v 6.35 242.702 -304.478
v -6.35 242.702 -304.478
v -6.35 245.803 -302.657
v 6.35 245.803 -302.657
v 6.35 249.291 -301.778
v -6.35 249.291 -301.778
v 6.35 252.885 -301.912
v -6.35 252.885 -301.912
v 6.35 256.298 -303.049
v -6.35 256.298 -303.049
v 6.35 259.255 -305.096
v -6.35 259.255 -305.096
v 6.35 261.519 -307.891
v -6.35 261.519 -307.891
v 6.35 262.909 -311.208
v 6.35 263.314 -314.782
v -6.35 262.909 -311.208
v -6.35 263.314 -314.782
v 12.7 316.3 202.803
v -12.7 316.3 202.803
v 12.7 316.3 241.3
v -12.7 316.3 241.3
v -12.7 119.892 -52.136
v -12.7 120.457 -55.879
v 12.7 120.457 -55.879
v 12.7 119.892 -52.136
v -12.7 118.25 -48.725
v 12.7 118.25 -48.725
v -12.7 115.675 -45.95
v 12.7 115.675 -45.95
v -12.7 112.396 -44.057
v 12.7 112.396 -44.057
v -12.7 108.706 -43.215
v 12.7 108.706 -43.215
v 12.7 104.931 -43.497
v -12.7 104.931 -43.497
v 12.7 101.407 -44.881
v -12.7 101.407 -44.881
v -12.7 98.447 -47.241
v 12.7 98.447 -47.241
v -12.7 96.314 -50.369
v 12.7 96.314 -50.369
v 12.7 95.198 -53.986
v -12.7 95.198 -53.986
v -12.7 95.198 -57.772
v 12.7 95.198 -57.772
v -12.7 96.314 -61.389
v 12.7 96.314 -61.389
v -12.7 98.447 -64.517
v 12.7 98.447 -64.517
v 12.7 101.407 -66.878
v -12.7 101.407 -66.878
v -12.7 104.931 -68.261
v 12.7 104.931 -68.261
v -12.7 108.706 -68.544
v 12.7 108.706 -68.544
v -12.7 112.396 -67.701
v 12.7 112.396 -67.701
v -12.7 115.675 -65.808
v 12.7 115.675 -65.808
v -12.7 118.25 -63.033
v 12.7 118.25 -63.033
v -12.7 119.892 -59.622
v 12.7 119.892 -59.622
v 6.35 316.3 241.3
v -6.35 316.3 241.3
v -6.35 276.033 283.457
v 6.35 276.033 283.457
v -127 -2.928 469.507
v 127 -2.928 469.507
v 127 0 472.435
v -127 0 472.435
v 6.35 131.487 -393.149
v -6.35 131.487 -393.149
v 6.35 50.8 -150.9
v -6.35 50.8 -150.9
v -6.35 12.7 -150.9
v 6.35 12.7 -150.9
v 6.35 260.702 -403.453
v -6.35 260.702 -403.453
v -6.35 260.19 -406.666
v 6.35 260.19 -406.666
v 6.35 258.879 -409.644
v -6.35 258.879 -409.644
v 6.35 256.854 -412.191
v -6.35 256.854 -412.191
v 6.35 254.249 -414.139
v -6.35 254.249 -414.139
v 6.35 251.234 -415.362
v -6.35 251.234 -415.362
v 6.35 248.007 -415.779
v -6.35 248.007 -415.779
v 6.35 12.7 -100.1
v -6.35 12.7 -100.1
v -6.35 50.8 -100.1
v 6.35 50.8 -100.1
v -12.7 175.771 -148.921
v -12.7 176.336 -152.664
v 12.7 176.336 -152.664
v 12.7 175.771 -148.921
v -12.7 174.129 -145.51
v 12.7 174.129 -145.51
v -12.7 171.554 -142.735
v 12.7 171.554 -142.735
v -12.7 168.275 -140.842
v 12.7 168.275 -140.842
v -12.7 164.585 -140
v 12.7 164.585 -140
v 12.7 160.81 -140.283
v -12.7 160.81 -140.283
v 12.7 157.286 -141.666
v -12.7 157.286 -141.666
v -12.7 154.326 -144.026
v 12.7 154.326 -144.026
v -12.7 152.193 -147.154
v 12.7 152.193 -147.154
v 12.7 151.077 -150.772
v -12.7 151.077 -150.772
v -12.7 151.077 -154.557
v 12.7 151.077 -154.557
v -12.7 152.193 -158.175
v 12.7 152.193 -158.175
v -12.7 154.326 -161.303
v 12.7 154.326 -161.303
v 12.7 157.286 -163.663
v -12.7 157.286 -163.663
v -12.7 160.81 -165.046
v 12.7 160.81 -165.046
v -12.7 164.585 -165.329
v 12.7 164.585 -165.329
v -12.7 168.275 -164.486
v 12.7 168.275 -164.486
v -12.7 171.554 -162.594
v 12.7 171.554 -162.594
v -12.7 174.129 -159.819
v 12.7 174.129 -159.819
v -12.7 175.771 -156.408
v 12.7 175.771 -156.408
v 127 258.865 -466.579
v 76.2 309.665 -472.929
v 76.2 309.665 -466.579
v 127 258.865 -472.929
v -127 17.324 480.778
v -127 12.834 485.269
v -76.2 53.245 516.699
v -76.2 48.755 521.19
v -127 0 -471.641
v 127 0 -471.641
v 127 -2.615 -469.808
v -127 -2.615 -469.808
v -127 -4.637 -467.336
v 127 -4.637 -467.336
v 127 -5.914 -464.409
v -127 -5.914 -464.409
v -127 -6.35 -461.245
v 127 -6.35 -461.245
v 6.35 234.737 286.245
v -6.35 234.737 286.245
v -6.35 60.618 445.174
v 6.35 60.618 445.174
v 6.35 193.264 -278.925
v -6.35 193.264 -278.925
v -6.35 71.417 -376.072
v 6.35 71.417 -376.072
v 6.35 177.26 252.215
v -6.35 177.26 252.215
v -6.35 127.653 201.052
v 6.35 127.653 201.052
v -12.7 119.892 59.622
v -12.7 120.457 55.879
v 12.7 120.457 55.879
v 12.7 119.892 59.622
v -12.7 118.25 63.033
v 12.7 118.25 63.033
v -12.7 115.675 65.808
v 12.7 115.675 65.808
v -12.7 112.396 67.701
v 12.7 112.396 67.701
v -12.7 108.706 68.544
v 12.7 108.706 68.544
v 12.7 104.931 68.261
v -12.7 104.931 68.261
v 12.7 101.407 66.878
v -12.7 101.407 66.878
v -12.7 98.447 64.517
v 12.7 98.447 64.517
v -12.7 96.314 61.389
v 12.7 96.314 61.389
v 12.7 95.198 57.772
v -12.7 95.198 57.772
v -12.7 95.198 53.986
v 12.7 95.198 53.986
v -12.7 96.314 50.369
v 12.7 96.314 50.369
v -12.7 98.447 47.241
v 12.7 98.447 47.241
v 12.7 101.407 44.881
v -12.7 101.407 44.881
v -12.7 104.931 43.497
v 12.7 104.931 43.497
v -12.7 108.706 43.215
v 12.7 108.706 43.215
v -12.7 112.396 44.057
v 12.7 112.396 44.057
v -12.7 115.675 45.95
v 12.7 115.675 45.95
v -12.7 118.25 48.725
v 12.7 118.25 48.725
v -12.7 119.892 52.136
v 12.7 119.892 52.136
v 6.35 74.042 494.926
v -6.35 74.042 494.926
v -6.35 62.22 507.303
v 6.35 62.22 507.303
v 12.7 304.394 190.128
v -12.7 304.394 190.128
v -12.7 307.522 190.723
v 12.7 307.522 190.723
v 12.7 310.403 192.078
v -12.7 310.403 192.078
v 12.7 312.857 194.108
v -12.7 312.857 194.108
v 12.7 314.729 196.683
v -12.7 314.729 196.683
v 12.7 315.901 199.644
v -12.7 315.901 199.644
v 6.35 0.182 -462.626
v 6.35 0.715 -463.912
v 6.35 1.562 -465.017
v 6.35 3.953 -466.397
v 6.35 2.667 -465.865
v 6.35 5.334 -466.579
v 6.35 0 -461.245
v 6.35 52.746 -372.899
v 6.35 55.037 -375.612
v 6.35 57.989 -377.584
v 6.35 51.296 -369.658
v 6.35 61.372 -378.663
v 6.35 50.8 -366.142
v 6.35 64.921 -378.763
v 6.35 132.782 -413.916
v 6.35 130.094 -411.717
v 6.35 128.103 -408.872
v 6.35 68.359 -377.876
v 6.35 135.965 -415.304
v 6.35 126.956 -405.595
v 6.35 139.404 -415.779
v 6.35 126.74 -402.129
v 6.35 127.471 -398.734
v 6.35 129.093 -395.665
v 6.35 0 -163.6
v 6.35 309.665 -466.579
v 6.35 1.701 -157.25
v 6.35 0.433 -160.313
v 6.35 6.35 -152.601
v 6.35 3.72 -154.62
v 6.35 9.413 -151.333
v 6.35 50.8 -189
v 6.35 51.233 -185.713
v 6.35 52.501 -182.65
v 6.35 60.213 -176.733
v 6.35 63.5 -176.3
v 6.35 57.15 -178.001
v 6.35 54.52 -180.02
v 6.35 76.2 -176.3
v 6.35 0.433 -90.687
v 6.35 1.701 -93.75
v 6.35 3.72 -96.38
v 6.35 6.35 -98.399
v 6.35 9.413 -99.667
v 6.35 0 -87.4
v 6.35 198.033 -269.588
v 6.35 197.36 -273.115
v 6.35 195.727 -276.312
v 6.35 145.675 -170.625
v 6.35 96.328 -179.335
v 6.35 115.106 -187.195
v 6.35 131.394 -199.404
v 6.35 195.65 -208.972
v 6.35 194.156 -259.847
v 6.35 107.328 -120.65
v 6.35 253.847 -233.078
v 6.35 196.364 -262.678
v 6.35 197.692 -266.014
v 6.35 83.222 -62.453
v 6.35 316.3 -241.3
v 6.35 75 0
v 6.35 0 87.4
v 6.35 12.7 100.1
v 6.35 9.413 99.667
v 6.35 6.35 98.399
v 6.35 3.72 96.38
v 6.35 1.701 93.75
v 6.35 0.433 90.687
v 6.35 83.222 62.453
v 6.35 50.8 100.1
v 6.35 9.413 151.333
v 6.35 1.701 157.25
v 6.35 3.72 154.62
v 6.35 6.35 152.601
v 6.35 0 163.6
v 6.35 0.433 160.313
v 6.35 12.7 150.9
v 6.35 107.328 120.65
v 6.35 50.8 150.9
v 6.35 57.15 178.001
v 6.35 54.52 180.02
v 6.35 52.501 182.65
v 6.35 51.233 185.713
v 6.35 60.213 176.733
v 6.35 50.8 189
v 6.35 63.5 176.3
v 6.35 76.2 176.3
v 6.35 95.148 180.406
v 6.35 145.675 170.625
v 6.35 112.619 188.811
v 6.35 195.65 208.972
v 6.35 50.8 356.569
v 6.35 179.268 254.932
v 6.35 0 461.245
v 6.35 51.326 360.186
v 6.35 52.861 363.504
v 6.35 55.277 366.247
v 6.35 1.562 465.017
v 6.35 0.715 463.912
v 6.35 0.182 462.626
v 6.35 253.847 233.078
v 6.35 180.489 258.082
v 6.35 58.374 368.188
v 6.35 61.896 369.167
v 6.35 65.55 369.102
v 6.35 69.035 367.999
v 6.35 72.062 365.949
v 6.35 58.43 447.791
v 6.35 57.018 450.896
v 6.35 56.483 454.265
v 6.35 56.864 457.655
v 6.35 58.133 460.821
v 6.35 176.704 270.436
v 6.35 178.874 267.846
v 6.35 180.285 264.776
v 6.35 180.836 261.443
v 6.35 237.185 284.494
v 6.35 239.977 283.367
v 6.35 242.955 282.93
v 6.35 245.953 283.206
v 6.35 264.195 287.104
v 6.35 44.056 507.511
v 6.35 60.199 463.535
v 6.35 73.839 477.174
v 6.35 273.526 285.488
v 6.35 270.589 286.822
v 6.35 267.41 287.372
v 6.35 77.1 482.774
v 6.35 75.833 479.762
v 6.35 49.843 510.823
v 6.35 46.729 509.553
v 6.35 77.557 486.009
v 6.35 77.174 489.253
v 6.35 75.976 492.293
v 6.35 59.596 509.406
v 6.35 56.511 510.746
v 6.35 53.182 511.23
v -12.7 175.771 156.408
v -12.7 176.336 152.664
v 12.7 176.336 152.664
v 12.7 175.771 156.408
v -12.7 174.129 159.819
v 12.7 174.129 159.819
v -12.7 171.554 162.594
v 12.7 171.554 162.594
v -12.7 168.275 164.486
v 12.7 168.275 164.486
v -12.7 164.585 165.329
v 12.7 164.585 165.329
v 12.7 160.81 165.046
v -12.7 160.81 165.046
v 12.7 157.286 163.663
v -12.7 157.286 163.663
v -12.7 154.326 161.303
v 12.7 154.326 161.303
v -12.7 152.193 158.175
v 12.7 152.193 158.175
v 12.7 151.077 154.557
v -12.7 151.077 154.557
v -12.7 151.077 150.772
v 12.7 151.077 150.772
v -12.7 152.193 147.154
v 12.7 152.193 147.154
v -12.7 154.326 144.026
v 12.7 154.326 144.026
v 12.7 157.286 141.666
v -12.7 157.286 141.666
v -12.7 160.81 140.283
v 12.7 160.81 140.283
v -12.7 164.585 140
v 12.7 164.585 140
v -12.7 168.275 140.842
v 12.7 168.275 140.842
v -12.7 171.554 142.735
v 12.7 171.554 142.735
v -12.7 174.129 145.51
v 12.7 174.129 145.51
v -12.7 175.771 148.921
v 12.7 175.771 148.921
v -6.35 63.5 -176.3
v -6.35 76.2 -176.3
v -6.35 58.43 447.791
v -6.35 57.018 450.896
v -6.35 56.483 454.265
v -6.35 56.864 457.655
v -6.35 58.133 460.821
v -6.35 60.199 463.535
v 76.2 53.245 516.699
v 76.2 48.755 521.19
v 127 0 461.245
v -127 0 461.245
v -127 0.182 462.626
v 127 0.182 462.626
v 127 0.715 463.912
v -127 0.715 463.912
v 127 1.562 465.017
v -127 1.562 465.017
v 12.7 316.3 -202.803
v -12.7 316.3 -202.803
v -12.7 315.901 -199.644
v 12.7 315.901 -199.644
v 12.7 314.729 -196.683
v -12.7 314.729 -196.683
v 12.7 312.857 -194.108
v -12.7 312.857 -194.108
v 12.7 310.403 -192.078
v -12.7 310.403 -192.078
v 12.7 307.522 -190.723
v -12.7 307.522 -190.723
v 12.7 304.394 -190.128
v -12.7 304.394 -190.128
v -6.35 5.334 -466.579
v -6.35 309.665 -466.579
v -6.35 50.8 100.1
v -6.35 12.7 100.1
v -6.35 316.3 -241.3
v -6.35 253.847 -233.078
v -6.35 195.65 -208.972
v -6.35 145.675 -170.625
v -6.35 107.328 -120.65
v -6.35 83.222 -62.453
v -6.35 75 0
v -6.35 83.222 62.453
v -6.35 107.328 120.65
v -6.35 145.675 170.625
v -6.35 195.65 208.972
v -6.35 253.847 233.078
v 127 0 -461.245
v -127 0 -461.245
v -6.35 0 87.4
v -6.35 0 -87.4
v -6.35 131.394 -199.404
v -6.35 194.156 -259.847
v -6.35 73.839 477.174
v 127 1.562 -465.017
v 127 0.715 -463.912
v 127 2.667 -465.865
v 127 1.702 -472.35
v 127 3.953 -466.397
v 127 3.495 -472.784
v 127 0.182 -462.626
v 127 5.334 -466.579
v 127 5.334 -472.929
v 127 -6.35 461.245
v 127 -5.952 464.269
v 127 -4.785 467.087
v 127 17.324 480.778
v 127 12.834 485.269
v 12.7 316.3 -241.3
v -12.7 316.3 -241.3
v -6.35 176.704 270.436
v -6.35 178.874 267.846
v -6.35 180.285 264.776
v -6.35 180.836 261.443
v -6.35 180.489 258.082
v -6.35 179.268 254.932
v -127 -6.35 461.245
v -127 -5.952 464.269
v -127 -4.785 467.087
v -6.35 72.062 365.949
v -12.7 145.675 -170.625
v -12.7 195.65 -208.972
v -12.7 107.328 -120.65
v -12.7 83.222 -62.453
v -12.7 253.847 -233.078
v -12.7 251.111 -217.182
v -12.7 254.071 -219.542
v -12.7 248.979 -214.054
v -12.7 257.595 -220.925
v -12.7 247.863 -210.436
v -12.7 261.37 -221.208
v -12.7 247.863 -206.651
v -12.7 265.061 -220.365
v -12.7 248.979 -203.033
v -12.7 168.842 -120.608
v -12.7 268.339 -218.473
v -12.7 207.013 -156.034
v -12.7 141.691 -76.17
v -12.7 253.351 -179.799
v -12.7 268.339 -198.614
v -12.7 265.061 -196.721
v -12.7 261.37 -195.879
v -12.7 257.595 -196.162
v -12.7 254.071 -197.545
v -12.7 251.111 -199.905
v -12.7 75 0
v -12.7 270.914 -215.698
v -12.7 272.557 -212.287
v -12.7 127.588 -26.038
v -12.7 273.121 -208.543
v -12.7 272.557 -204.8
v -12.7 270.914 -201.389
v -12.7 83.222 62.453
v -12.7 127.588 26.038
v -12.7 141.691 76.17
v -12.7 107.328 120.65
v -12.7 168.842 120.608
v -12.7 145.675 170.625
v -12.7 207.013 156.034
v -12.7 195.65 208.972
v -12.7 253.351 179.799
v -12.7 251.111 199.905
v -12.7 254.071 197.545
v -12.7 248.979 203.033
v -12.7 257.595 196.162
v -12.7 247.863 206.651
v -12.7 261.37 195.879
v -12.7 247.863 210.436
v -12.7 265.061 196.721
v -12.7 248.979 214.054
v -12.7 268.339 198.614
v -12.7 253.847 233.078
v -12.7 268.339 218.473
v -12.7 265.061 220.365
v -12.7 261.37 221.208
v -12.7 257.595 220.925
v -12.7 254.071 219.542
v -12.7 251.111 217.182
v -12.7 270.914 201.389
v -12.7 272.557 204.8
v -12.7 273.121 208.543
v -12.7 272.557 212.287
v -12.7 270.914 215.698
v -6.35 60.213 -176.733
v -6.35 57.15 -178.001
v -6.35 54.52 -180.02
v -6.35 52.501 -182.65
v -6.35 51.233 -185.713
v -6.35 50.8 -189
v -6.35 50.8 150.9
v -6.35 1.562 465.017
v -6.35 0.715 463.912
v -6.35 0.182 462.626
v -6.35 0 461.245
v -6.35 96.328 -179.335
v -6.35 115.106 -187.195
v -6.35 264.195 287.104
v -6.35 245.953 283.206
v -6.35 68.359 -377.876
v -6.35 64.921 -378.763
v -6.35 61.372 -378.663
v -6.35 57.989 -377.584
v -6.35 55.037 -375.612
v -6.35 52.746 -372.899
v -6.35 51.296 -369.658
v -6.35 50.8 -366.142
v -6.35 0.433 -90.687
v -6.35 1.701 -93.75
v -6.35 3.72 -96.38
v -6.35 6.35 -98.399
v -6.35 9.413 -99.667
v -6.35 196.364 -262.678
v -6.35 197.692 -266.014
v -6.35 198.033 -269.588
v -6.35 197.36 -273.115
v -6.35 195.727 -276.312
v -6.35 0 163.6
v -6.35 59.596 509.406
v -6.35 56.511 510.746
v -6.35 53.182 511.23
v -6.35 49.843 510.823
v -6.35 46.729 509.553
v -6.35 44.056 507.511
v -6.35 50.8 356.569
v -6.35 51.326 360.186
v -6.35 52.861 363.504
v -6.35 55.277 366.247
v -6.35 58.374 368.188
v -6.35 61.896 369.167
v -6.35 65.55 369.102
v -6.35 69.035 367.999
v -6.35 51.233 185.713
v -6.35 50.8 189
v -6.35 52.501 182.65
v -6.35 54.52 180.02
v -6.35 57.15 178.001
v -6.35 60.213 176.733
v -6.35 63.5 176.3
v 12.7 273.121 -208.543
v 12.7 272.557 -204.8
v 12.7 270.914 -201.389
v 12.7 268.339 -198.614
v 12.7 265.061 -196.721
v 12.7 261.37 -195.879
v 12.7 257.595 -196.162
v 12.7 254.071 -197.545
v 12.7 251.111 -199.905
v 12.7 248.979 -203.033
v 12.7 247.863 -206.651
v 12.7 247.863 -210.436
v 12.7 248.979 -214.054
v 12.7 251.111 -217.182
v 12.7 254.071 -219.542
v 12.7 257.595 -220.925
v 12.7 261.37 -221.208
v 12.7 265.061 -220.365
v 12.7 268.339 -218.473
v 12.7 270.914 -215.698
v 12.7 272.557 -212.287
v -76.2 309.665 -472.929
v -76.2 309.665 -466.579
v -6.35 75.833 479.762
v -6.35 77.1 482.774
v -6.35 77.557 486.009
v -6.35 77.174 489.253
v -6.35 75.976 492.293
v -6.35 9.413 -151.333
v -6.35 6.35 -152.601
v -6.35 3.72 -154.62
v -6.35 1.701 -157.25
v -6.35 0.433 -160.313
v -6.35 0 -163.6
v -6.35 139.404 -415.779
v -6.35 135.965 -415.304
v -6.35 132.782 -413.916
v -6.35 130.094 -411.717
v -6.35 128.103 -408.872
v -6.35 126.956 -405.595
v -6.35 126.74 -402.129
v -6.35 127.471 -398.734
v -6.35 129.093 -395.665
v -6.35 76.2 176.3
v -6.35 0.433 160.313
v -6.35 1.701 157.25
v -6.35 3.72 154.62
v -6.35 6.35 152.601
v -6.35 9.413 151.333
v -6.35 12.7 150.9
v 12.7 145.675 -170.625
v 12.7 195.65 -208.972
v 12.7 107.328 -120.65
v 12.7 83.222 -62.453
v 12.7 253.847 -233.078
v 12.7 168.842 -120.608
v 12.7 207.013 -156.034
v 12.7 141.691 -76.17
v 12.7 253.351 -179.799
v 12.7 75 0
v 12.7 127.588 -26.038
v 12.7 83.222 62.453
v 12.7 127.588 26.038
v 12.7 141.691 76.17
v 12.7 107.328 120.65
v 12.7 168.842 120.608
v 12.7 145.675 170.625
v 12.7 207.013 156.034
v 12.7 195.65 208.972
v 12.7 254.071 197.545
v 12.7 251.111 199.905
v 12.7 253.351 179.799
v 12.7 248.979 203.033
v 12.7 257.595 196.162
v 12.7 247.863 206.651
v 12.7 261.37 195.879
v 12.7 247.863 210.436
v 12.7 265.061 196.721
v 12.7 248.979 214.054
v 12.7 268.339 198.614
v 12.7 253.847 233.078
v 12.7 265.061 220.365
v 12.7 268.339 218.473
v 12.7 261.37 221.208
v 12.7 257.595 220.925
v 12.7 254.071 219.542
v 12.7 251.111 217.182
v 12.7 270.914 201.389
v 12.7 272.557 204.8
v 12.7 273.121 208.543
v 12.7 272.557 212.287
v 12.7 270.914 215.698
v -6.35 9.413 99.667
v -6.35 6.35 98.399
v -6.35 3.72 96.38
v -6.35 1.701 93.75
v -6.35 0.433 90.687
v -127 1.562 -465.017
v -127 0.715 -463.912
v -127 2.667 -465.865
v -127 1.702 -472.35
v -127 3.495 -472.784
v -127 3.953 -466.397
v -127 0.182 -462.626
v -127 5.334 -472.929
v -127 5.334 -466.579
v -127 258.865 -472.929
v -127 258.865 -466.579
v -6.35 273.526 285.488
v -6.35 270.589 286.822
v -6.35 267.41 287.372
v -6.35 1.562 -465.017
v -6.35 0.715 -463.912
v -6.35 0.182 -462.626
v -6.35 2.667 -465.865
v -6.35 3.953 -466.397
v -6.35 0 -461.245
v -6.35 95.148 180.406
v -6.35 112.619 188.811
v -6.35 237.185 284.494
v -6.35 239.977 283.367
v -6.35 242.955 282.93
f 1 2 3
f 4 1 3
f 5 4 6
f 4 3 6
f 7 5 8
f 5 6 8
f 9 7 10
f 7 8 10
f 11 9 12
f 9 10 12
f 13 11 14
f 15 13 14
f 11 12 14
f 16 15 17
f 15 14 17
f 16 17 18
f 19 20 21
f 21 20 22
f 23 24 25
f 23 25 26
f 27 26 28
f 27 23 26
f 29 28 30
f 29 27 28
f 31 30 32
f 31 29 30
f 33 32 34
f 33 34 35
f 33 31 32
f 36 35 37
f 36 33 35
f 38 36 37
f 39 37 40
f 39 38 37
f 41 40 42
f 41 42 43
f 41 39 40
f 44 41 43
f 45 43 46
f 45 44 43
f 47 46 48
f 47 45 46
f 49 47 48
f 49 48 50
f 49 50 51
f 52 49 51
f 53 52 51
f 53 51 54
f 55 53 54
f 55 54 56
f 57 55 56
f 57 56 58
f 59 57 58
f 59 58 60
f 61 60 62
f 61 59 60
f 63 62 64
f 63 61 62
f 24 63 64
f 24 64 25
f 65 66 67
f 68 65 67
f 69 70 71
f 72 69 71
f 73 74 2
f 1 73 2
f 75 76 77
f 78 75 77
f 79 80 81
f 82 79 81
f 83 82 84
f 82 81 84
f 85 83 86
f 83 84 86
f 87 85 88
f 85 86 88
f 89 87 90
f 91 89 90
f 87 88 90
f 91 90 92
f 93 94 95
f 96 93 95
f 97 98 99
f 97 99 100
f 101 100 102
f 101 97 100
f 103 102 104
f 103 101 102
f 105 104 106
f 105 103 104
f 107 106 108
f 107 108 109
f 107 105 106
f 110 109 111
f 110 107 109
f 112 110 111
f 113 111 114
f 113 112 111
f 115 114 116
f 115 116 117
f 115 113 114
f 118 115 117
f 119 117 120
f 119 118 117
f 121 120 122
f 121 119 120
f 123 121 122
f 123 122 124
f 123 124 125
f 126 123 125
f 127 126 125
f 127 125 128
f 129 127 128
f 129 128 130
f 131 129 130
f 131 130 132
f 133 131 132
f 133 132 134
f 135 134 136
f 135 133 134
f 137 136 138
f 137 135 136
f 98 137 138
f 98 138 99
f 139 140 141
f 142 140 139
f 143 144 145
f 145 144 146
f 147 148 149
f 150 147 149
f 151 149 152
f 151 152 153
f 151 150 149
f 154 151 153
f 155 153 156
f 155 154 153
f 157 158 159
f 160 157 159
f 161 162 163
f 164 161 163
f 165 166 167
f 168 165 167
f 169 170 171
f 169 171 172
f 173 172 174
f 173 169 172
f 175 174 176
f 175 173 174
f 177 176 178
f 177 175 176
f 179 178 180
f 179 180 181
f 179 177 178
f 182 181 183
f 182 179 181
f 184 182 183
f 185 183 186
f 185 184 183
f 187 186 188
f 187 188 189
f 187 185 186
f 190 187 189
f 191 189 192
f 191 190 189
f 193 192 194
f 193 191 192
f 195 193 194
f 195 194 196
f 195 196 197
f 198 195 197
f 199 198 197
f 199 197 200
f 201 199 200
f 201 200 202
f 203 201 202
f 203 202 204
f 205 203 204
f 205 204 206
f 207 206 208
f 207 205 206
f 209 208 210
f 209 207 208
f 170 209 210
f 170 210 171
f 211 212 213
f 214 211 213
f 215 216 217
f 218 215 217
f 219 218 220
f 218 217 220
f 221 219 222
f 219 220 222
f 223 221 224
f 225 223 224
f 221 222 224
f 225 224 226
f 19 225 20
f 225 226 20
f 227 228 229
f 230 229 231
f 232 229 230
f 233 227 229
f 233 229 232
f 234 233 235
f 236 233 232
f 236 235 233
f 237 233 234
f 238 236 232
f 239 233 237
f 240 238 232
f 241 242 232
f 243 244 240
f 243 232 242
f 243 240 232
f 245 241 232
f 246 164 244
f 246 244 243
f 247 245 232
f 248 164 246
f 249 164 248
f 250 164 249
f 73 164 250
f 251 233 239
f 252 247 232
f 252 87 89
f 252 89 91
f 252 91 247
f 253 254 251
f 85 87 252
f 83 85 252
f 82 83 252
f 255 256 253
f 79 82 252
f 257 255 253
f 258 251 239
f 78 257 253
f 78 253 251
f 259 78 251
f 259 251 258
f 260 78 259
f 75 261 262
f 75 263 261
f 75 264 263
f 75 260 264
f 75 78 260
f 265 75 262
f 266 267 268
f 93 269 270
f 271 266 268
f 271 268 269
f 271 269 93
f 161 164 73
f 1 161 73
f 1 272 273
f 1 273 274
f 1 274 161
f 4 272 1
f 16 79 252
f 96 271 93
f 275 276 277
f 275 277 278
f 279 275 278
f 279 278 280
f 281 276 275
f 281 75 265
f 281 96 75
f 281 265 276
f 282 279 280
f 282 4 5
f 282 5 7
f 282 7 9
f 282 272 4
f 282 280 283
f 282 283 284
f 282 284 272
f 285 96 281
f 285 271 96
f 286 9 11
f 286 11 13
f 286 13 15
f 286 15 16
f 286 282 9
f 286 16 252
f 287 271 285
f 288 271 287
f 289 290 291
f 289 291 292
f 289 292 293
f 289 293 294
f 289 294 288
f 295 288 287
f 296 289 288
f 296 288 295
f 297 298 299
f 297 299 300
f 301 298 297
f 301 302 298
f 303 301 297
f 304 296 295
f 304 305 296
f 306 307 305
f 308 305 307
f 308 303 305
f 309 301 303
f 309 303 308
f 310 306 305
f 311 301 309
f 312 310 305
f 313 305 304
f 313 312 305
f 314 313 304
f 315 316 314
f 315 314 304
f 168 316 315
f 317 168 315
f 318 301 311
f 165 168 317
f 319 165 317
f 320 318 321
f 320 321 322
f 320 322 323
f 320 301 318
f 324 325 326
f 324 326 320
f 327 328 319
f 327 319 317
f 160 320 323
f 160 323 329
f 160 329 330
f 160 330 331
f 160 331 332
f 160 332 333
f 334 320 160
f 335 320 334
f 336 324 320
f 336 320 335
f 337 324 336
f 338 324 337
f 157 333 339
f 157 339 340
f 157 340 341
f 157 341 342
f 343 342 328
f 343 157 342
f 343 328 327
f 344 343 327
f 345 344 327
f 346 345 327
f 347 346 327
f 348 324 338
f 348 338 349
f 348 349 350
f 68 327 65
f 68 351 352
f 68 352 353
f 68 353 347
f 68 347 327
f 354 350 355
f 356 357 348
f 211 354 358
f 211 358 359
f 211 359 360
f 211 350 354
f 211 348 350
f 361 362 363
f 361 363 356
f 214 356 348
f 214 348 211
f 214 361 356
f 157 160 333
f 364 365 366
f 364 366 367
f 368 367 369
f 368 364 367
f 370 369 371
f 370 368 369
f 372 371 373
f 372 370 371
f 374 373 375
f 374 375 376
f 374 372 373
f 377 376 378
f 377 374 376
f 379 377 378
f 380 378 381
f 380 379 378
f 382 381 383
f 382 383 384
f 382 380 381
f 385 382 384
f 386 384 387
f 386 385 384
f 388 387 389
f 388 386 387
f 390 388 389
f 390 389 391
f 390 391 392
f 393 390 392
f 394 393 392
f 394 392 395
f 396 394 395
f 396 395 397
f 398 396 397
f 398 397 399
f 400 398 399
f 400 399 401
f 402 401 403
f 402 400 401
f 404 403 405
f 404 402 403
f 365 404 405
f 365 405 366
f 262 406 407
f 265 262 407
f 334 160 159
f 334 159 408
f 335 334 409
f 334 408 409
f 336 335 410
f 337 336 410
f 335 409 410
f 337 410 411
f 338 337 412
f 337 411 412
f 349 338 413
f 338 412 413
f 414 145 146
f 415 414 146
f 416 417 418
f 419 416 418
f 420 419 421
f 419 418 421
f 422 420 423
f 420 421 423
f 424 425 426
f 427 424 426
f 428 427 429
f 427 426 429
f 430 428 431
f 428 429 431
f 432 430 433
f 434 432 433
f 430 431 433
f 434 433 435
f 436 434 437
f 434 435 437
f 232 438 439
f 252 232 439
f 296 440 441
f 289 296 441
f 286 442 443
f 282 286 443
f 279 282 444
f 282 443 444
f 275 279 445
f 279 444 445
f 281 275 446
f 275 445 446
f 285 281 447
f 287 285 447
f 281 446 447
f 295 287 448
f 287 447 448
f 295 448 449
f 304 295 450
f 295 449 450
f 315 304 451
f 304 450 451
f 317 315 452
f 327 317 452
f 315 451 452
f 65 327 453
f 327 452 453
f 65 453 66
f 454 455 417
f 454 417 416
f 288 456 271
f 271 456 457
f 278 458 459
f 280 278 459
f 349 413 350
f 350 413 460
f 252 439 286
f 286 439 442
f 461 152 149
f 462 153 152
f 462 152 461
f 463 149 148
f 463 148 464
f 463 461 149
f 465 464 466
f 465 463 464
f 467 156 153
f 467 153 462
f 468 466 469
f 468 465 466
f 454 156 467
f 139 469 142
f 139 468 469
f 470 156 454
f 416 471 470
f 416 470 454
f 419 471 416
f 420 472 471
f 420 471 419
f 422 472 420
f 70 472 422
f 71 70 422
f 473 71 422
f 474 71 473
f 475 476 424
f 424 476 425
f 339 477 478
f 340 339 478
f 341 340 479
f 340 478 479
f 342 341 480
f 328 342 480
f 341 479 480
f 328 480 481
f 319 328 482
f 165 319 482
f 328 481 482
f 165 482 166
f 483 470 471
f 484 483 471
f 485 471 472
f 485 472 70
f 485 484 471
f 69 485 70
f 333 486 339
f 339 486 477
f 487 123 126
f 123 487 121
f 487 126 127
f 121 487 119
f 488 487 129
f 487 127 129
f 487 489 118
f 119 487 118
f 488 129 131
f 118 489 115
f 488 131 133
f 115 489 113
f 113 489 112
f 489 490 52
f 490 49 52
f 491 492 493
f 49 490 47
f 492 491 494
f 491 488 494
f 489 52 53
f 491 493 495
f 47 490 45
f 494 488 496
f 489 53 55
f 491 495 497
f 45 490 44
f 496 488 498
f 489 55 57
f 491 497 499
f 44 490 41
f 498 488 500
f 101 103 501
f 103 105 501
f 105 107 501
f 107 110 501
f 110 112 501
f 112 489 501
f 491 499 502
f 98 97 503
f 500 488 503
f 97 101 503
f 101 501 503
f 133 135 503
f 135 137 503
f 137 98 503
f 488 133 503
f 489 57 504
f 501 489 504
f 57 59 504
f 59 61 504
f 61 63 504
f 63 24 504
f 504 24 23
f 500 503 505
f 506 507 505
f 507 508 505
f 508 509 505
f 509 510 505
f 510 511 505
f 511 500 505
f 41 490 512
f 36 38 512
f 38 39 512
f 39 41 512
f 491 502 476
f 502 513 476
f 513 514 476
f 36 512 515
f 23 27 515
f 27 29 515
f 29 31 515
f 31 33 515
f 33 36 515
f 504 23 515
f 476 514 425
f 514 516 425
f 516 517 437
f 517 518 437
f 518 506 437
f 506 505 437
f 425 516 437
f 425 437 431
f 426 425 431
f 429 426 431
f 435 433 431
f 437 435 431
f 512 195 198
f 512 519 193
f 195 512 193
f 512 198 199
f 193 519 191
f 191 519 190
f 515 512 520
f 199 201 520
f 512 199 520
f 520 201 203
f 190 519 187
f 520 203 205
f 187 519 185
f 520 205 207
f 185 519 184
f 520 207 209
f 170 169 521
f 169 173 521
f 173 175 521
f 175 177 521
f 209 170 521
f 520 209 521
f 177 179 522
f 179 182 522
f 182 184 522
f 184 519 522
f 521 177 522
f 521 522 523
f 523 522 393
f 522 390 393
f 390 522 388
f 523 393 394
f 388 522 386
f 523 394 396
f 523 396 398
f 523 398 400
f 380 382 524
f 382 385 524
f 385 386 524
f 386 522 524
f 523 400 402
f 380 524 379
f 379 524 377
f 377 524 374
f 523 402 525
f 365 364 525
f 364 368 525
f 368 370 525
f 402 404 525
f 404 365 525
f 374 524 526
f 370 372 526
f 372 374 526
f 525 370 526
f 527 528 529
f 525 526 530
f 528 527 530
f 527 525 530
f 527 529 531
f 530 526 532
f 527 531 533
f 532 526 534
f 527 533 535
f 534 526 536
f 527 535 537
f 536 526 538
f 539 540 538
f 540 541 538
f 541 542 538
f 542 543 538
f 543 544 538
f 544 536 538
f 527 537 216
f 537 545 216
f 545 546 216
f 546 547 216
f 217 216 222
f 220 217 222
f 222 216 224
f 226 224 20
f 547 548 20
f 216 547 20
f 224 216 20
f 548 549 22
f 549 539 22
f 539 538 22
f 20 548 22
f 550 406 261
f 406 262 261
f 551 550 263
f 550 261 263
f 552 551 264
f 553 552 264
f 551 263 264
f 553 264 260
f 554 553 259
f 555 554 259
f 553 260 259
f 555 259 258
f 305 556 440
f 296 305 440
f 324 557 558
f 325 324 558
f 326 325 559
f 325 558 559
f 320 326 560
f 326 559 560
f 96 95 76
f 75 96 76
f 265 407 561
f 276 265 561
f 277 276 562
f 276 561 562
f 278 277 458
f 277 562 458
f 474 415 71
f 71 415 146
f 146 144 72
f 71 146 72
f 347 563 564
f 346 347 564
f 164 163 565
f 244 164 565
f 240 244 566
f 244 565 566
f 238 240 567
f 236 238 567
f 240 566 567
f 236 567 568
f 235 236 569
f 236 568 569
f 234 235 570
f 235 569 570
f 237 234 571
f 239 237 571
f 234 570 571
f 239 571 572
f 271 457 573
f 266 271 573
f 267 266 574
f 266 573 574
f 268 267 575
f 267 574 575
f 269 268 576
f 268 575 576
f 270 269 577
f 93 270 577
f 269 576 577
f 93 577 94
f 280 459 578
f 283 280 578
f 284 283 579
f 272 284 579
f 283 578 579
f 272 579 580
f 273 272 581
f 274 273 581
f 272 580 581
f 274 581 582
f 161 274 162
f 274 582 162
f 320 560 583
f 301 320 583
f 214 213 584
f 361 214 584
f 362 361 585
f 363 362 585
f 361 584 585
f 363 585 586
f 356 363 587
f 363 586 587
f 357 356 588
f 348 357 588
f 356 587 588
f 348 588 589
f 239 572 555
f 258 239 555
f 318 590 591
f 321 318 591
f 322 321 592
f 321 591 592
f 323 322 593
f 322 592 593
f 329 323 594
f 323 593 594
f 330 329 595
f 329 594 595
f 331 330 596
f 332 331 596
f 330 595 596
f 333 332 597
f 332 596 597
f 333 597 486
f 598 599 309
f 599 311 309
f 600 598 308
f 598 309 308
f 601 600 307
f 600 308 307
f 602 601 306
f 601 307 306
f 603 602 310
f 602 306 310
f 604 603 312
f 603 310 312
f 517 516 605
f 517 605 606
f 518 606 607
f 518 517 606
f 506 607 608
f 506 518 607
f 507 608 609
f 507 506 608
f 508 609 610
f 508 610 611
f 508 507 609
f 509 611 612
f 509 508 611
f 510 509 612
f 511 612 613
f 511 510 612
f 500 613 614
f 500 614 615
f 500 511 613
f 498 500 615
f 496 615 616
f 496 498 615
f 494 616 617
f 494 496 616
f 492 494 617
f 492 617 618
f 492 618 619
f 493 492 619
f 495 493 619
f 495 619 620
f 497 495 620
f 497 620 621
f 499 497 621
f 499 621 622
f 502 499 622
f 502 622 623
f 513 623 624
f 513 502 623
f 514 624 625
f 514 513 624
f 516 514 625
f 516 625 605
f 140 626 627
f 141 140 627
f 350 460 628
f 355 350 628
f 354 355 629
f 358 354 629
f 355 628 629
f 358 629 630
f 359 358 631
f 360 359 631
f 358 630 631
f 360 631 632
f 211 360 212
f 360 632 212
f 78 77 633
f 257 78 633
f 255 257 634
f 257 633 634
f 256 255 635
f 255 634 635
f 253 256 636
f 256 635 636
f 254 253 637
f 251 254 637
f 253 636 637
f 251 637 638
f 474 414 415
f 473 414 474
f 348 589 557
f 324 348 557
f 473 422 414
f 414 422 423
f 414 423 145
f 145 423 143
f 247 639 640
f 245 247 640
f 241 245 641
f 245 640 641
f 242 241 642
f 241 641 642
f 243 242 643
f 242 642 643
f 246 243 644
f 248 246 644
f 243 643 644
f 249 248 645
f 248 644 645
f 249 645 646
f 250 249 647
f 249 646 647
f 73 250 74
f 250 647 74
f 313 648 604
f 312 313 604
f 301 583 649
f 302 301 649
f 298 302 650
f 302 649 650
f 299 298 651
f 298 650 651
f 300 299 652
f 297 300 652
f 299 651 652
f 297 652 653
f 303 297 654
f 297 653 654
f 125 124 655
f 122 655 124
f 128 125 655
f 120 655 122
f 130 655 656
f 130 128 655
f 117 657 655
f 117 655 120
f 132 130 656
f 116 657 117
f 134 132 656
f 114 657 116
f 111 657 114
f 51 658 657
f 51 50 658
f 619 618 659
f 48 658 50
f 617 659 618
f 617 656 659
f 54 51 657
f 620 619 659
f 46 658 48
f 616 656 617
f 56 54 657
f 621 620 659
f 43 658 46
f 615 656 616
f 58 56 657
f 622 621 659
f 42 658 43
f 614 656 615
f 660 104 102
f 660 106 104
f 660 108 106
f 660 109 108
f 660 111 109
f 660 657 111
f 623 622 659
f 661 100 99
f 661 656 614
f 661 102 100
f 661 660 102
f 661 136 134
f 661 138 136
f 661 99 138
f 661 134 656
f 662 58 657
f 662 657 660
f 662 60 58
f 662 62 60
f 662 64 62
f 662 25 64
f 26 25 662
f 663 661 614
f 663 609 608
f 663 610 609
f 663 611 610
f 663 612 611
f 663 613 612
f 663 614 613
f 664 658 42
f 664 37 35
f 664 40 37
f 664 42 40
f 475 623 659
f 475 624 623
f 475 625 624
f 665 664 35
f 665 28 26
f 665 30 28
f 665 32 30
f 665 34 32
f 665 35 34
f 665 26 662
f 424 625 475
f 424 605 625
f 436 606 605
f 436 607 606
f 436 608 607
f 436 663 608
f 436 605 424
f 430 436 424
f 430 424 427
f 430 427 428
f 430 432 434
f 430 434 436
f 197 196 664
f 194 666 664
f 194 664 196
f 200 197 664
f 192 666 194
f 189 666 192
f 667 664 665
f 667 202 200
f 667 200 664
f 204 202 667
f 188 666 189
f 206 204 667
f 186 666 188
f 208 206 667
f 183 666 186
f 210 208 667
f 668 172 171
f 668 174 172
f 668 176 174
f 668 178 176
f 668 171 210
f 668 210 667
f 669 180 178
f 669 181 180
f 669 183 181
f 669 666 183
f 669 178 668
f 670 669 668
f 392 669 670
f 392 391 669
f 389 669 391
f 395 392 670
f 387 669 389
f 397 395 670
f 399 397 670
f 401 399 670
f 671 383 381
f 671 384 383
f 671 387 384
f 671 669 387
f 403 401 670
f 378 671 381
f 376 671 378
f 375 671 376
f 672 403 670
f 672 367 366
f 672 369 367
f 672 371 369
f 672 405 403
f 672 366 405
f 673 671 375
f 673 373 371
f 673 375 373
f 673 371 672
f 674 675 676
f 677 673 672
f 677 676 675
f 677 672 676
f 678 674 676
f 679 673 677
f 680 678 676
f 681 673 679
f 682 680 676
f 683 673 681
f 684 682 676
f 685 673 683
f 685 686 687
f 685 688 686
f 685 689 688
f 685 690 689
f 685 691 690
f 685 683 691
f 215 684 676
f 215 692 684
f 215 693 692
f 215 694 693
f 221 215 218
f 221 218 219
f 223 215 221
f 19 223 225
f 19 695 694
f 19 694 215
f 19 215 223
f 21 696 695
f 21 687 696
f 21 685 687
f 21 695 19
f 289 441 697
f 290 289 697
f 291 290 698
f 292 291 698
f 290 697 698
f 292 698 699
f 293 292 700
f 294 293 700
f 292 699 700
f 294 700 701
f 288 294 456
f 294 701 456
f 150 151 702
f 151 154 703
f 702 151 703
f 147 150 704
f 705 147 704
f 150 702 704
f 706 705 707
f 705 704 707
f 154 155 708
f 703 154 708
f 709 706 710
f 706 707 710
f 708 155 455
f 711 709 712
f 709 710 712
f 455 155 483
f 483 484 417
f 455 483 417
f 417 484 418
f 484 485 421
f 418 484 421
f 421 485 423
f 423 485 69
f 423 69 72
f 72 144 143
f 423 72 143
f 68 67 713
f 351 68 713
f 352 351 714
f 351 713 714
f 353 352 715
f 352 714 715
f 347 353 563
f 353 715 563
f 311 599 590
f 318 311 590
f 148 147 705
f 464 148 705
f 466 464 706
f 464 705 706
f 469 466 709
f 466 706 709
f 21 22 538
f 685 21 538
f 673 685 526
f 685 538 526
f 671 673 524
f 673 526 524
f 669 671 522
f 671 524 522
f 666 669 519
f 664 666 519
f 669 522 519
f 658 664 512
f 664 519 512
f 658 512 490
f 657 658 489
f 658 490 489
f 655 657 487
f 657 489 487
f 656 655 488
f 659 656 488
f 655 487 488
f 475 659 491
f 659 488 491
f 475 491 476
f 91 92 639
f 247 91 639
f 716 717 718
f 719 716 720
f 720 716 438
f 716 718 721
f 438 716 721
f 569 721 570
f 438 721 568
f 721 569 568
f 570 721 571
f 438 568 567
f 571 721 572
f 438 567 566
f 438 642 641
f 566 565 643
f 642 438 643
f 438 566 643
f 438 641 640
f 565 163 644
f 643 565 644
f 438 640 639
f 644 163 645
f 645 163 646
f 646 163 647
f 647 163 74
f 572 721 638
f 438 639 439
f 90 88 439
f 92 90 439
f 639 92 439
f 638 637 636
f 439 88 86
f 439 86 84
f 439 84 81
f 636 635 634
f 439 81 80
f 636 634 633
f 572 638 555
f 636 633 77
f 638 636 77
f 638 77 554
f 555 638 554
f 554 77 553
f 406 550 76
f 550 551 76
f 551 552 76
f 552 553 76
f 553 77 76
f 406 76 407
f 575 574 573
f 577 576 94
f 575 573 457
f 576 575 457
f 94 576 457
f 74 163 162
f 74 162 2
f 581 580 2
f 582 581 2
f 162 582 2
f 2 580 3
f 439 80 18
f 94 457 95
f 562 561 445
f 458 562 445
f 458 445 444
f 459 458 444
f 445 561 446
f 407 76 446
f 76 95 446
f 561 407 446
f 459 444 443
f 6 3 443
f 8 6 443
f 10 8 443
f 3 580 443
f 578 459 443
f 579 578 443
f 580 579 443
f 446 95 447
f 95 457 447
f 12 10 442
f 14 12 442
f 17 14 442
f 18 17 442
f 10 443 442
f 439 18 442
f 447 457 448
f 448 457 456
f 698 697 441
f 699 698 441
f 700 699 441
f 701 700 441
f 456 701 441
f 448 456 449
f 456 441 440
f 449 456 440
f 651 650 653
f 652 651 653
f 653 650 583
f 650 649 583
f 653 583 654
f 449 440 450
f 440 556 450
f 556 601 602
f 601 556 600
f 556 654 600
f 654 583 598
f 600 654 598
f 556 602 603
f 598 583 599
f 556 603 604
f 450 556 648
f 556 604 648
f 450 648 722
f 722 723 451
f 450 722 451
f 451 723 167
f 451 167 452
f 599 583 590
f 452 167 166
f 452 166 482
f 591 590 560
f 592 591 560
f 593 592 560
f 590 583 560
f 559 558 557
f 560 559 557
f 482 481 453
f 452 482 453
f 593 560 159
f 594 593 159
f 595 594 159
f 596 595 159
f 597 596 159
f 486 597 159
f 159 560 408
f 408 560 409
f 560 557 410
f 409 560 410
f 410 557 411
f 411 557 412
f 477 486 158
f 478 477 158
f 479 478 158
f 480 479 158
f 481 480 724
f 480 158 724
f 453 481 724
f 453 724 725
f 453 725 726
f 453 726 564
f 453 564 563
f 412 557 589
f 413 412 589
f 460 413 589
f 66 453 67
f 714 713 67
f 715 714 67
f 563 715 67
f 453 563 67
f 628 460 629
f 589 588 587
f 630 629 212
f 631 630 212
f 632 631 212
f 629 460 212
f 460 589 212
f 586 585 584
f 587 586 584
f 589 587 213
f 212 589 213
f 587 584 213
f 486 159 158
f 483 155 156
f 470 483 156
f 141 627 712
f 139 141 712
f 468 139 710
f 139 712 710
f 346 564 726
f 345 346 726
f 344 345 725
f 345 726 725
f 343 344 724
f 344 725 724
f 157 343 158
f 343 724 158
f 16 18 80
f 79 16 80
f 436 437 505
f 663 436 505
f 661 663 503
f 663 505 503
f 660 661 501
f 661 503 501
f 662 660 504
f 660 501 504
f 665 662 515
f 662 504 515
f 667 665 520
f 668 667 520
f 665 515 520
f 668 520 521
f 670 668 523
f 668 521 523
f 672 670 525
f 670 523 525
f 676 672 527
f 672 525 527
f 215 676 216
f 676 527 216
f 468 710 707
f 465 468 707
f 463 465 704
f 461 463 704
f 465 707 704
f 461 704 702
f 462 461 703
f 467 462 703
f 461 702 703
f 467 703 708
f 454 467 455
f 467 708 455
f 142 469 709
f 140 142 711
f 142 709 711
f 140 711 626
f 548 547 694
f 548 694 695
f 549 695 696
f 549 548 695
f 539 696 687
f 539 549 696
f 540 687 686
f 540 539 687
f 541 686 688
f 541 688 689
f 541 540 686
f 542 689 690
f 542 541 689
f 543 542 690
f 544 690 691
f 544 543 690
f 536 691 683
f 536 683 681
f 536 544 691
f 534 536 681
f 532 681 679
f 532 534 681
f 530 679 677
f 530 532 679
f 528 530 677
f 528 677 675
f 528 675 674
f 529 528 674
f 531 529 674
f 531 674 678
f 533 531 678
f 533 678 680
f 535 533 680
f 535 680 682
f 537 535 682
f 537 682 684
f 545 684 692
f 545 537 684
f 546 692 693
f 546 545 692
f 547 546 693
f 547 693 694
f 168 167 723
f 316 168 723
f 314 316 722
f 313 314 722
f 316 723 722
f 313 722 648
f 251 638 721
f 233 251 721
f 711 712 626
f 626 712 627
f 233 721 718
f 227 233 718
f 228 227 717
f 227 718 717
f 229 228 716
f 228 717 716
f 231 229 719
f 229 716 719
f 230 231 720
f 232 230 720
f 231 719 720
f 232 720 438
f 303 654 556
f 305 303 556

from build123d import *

# Parameters (mm, degrees)
FLANGE_PROFILE_DEPTH              = 12.7
F_7_8_1_DIAMETER_HOLE1_D          = 25.4
BOLT_PATTERN_COUNT                = 12
SKETCH5_W                         = 254
SKETCH5_H                         = 1317.865260112
BASE_SKID_DEPTH                   = 6.35
BEND_START                        = -127
BEND_HEEL_DEPTH                   = 254
BEND_HEEL_2_DEPTH                 = 254
BEND_TOE_DEPTH                    = 254
BEND_TOE_2_DEPTH                  = 254
WEBBING_BODY_DEPTH                = 6.35
WEBBING_HOLES_DEPTH               = 623.746559258
WEBBING_HOLES_DEPTH_BACK          = 623.746559258
CROSSBEAM_DEPTH                   = 623.746559258
CROSSBEAM_DEPTH_BACK              = 623.746559258
CROSSMEMBER_W                     = 50.8
CROSSMEMBER_H                     = 50.8
CROSSBEAM_CLEARANCE_DEPTH         = 6.35
CROSSBEAM_FILLET_R                = 12.7
FILLET_CLEARANCE_R                = 82.7
WEBBING_FILLET_R                  = 12.7
SKID_START                        = -376
SKID_EDGES_OUTLINE_W              = 201
SKID_EDGES_OUTLINE_H              = 6.35
SKID_EDGES_DEPTH                  = 37.146275522
SKID_START_2                      = 338.853724478
SKID_EDGES_2_OUTLINE_W            = 200
SKID_EDGES_2_OUTLINE_H            = 6.35
SKID_EDGES_2_DEPTH                = 37.146275522
SKID_START_3                      = -310
SKID_EDGES_3_OUTLINE_W            = 200
SKID_EDGES_3_OUTLINE_H            = 9
SKID_EDGES_3_DEPTH                = 37.152572811
SKID_START_4                      = 272.847427189
SKID_EDGES_4_OUTLINE_W            = 201
SKID_EDGES_4_OUTLINE_H            = 9
SKID_EDGES_4_DEPTH                = 37.152572811
FLANGE_FILLET_R                   = 12.7
CONVERT_START                     = -12.7
CONVERT_FLANGE_TO_SHEET_OUTLINE_R = 12.7
CONVERT_FLANGE_TO_SHEET_DEPTH     = 25.4
CONVERT_START_2                   = -6.35
CONVERT_WEBBING_TO_SHEET_DEPTH    = 12.7
FILLET2_R                         = 12.7


with BuildPart() as part:
    # Sketch1 → Flange Profile (new, symmetric)
    with BuildSketch(Plane(origin=(0, 0, 0), x_dir=(0, 0, -1), z_dir=(1, 0, 0))):
        with BuildLine():
            Line((241.3, 316.3), (190.5, 316.3))
            ThreePointArc((190.5, 316.3), (0, 125.8), (-190.5, 316.3))
            Line((-190.5, 316.3), (-241.3, 316.3))
            ThreePointArc((-241.3, 316.3), (0, 75), (241.3, 316.3))
        make_face()
    extrude(amount=FLANGE_PROFILE_DEPTH, both=True)

    # 7/8 (1) Diameter Hole1 (through all)
    with Locations(Plane(origin=(12.7, 260.420968162, -208.543385896), x_dir=(0, 0, 1), z_dir=(1, 0, 0))):
        with Locations((0, 0)):
            f_7_8_1_diameter_hole1 = Hole(F_7_8_1_DIAMETER_HOLE1_D / 2)

    # Bolt Pattern: 7/8 (1) Diameter Hole1 ×12 about axis
    bolt_pattern_axis = Axis((0, 316.3, 0), (1, 0, 0))
    for i in range(1, BOLT_PATTERN_COUNT):
        add(f_7_8_1_diameter_hole1.rotate(bolt_pattern_axis, i * 360 / BOLT_PATTERN_COUNT), mode=Mode.SUBTRACT)

    # Flange Fillet
    flange_fillet_edges = [part.edges().sort_by_distance(p)[0] for p in [
        (0, 316.3, 190.5),
        (0, 316.3, -190.5),
    ]]
    fillet(flange_fillet_edges, radius=FLANGE_FILLET_R)


with BuildPart() as body_2:
    # Base Skid: sheet metal written as solids
    # Sketch5 → Base Skid (new body)
    with BuildSketch(Plane(origin=(0, 0, 0), x_dir=(1, 0, 0), z_dir=(0, 1, 0))):
        with Locations((0, 118.6125)):
            Rectangle(SKETCH5_W, SKETCH5_H)
    extrude(amount=-BASE_SKID_DEPTH)

    # Bend Heel: read off the stored shape, not the designer's step
    # Bend Heel outline → Bend Heel (cut)
    with BuildSketch(Plane.YZ.offset(BEND_START)):
        with BuildLine():
            Line((0, -777.545130056), (0, -471.640528076))
            ThreePointArc((0, -471.640528076), (-4.636915504, -467.33583609), (-6.35, -461.245130056))
            Line((-6.35, -461.245130056), (-6.35, -777.545130056))
            Line((-6.35, -777.545130056), (0, -777.545130056))
        make_face()
    extrude(amount=BEND_HEEL_DEPTH, mode=Mode.SUBTRACT)

    # Bend Heel 2 outline → Bend Heel 2 (add)
    with BuildSketch(Plane.YZ.offset(BEND_START)):
        with BuildLine():
            Line((5.334, -472.929130056), (309.66453199, -472.929130056))
            Line((309.66453199, -472.929130056), (309.66453199, -466.579130056))
            Line((309.66453199, -466.579130056), (5.334, -466.579130056))
            ThreePointArc((5.334, -466.579130056), (1.56229243, -465.016837626), (0, -461.245130056))
            Line((0, -461.245130056), (0, -471.640528076))
            ThreePointArc((0, -471.640528076), (2.590277571, -472.602411563), (5.334, -472.929130056))
        make_face()
    extrude(amount=BEND_HEEL_2_DEPTH)

    # Bend Toe: read off the stored shape, not the designer's step
    # Bend Toe outline → Bend Toe (cut)
    with BuildSketch(Plane.YZ.offset(BEND_START)):
        with BuildLine():
            Line((-6.35, 540.320130056), (-6.35, 461.245130056))
            ThreePointArc((-6.35, 461.245130056), (-5.460608458, 465.71640328), (-2.927835631, 469.506965687))
            Line((-2.927835631, 469.506965687), (0, 472.434801318))
            Line((0, 472.434801318), (0, 540.320130056))
            Line((0, 540.320130056), (-6.35, 540.320130056))
        make_face()
    extrude(amount=BEND_TOE_DEPTH, mode=Mode.SUBTRACT)

    # Bend Toe 2 outline → Bend Toe 2 (add)
    with BuildSketch(Plane.YZ.offset(BEND_START)):
        with BuildLine():
            Line((48.754787092, 521.189588411), (0, 472.434801318))
            Line((0, 472.434801318), (0, 461.245130056))
            ThreePointArc((0, 461.245130056), (0.406026574, 463.286363484), (1.562292429, 465.016837626))
            Line((1.562292429, 465.016837626), (53.244915153, 516.69946035))
            Line((53.244915153, 516.69946035), (48.754787092, 521.189588411))
        make_face()
    extrude(amount=BEND_TOE_2_DEPTH)

    # Skid Edges: read off the stored shape, not the designer's step
    # Skid Edges outline → Skid Edges (cut)
    with BuildSketch(Plane(origin=(0, 0, 0), x_dir=(0.7071067811865501, 0.4999999999999991, 0.499999999999997), z_dir=(0.7071067811865449, -0.5000000000000029, -0.5000000000000008)).offset(SKID_START)):
        with Locations((258.5, 330.886851681)):
            Rectangle(SKID_EDGES_OUTLINE_W, SKID_EDGES_OUTLINE_H)
    extrude(amount=SKID_EDGES_DEPTH, mode=Mode.SUBTRACT)

    # Skid Edges 2 outline → Skid Edges 2 (cut)
    with BuildSketch(Plane(origin=(0, 0, 0), x_dir=(0.7071067811865501, -0.4999999999999991, -0.499999999999997), z_dir=(0.7071067811865449, 0.5000000000000029, 0.5000000000000008)).offset(SKID_START_2)):
        with Locations((-258, -330.886851681)):
            Rectangle(SKID_EDGES_2_OUTLINE_W, SKID_EDGES_2_OUTLINE_H)
    extrude(amount=SKID_EDGES_2_DEPTH, mode=Mode.SUBTRACT)

    # Skid Edges 3 outline → Skid Edges 3 (cut)
    with BuildSketch(Plane(origin=(0, 0, 0), x_dir=(0.7071067811865474, 0.7071067811865477, 0), z_dir=(0.7071067811865476, -0.7071067811865476, 0)).offset(SKID_START_3)):
        with Locations((192, -469.5)):
            Rectangle(SKID_EDGES_3_OUTLINE_W, SKID_EDGES_3_OUTLINE_H)
    extrude(amount=SKID_EDGES_3_DEPTH, mode=Mode.SUBTRACT)

    # Skid Edges 4 outline → Skid Edges 4 (cut)
    with BuildSketch(Plane(origin=(0, 0, 0), x_dir=(0.707106781186548, -0.707106781186547, 0), z_dir=(0.707106781186547, 0.707106781186548, 0)).offset(SKID_START_4)):
        with Locations((-192.5, 469.5)):
            Rectangle(SKID_EDGES_4_OUTLINE_W, SKID_EDGES_4_OUTLINE_H)
    extrude(amount=SKID_EDGES_4_DEPTH, mode=Mode.SUBTRACT)


with BuildPart() as body_3:
    # Sketch12 → Webbing Body (new, symmetric)
    with BuildSketch(Plane(origin=(0, 0, 0), x_dir=(0, 0, -1), z_dir=(1, 0, 0))):
        with BuildLine():
            Line((-516.69946035, 53.244915153), (-465.016837626, 1.562292429))
            ThreePointArc((-465.016837626, 1.562292429), (-463.286363484, 0.406026574), (-461.245130056, 0))
            Line((-461.245130056, 0), (461.245130056, 0))
            ThreePointArc((461.245130056, 0), (465.016837626, 1.562292429), (466.579130056, 5.334))
            Line((466.579130056, 5.334), (466.579130056, 309.66453199))
            Line((466.579130056, 309.66453199), (241.3, 316.3))
            ThreePointArc((241.3, 316.3), (0, 75), (-241.3, 316.3))
            Line((-241.3, 316.3), (-516.69946035, 53.244915153))
        make_face()
    extrude(amount=WEBBING_BODY_DEPTH, both=True)

    # Sketch13 → Webbing Holes (cut, two sides: drawn at the far end of the back side and taken through both)
    with BuildSketch(Plane(origin=(0, 0, 0), x_dir=(0, 0, -1), z_dir=(1, 0, 0)).offset(-WEBBING_HOLES_DEPTH_BACK)):
        Polygon((415.779130056, 260.338785622), (287.40157486, 264.120073132), (415.779130056, 103.103449381), align=None)
        Polygon((-121.787355666, 50.8), (-385.355758001, 50.8), (-261.612051176, 186.371001392), align=None)
        Polygon((269.894826504, 204.589693285), (392.510394874, 50.8), (121.787355666, 50.8), align=None)
        Polygon((-454.135463722, 50.8), (-485.950787611, 82.615323889), (-288.586784033, 271.132776469), (-281.840137894, 239.563133553), align=None)
    extrude(amount=WEBBING_HOLES_DEPTH + WEBBING_HOLES_DEPTH_BACK, mode=Mode.SUBTRACT)

    # crossmember → Crossbeam (cut, two sides: drawn at the far end of the back side and taken through both)
    with BuildSketch(Plane(origin=(0, 0, 0), x_dir=(0, 0, -1), z_dir=(1, 0, 0)).offset(-CROSSBEAM_DEPTH_BACK)):
        with Locations((125.5, 25.4)):
            Rectangle(CROSSMEMBER_W, CROSSMEMBER_H)
        with Locations((-125.5, 25.4)):
            Rectangle(CROSSMEMBER_W, CROSSMEMBER_H)
    extrude(amount=CROSSBEAM_DEPTH + CROSSBEAM_DEPTH_BACK, mode=Mode.SUBTRACT)

    # crossmember<5> → Crossbeam Clearance (add, symmetric)
    with BuildSketch(Plane(origin=(0, 0, 0), x_dir=(0, 0, -1), z_dir=(1, 0, 0))):
        Polygon((100.1, 50.8), (150.9, 50.8), (150.9, 0), (176.3, 0), (176.3, 76.2), (74.7, 76.2), (74.7, 0), (100.1, 0), align=None)
        Polygon((-100.1, 0), (-74.7, 0), (-74.7, 76.2), (-176.3, 76.2), (-176.3, 0), (-150.9, 0), (-150.9, 50.8), (-100.1, 50.8), align=None)
    extrude(amount=CROSSBEAM_CLEARANCE_DEPTH, both=True)

    # Crossbeam fillet
    crossbeam_fillet_edges = [body_3.edges().sort_by_distance(p)[0] for p in [
        (0, 0, -150.9),
        (0, 0, -100.1),
        (0, 0, 100.1),
        (0, 0, 150.9),
    ]]
    fillet(crossbeam_fillet_edges, radius=CROSSBEAM_FILLET_R)

    # Fillet Clearance
    # the kernel refuses this fillet: 82.7 mm, written as the material it adds along each edge
    with BuildSketch(Plane(origin=(6.35, 76.2, -146.248876324), x_dir=(0, 0, -1), z_dir=(-1, 0, 0))) as fillet_clearance_piece_1:
        with BuildLine():
            CenterArc((112.722573697, 2.172867127), FILLET_CLEARANCE_R, 181.505567644, 42.416154829)
            Line((53.154741922, -55.194052066), (0, 0))
            Line((0, 0), (30.051123676, 0))
        make_face()
    extrude(amount=12.7)
    with BuildSketch(Plane(origin=(-6.35, 76.2, 147.984309509), x_dir=(0, 0.6961019539421004, 0.7179429432190206), z_dir=(1, 0, 0))) as fillet_clearance_piece_2:
        with BuildLine():
            CenterArc((73.916608705, 82.7), FILLET_CLEARANCE_R, 229.610877342, 40.389122658)
            Line((20.32905017, 19.710607478), (0, 0))
            Line((0, 0), (73.916608705, 0))
        make_face()
    extrude(amount=12.7)

    # Webbing Fillet
    webbing_fillet_edges = [body_3.edges().sort_by_distance(p)[0] for p in [
        (0, 53.244915153, 516.69946035),
        (0, 82.615323889, 485.950787611),
        (0, 271.132776469, 288.586784033),
        (0, 239.563133553, 281.840137894),
        (0, 50.8, 454.135463722),
        (0, 204.589693285, -269.894826504),
        (0, 50.8, -392.510394874),
        (0, 186.371001392, 261.612051176),
        (0, 50.8, 385.355758001),
        (0, 260.338785622, -415.779130056),
        (0, 103.103449381, -415.779130056),
        (0, 264.120073132, -287.40157486),
    ]]
    fillet(webbing_fillet_edges, radius=WEBBING_FILLET_R)


with BuildPart() as body_4:
    # Convert Flange to Sheet: read off the stored shape, not the designer's step
    # Convert Flange to Sheet outline → Convert Flange to Sheet (new body)
    with BuildSketch(Plane.YZ.offset(CONVERT_START)):
        with BuildLine():
            ThreePointArc((304.39375, 190.127565626), (312.856636133, 194.107641068), (316.3, 202.802736668))
            Line((316.3, 202.802736668), (316.3, 241.3))
            ThreePointArc((316.3, 241.3), (75, 0), (316.3, -241.3))
            Line((316.3, -241.3), (316.3, -202.802736668))
            ThreePointArc((316.3, -202.802736668), (312.856636133, -194.107641068), (304.39375, -190.127565626))
            ThreePointArc((304.39375, -190.127565626), (125.8, 0), (304.39375, 190.127565626))
        make_face()
        with Locations((163.635645942, -152.664354058)):
            Circle(CONVERT_FLANGE_TO_SHEET_OUTLINE_R, mode=Mode.SUBTRACT)
        with Locations((107.756614104, -55.879031838)):
            Circle(CONVERT_FLANGE_TO_SHEET_OUTLINE_R, mode=Mode.SUBTRACT)
        with Locations((260.420968162, -208.543385896)):
            Circle(CONVERT_FLANGE_TO_SHEET_OUTLINE_R, mode=Mode.SUBTRACT)
        with Locations((107.756614104, 55.879031838)):
            Circle(CONVERT_FLANGE_TO_SHEET_OUTLINE_R, mode=Mode.SUBTRACT)
        with Locations((163.635645942, 152.664354058)):
            Circle(CONVERT_FLANGE_TO_SHEET_OUTLINE_R, mode=Mode.SUBTRACT)
        with Locations((260.420968162, 208.543385896)):
            Circle(CONVERT_FLANGE_TO_SHEET_OUTLINE_R, mode=Mode.SUBTRACT)
    extrude(amount=CONVERT_FLANGE_TO_SHEET_DEPTH)


with BuildPart() as body_5:
    # Convert Webbing to Sheet: read off the stored shape, not the designer's step
    # Convert Webbing to Sheet outline → Convert Webbing to Sheet (new body)
    with BuildSketch(Plane.YZ.offset(CONVERT_START_2)):
        with BuildLine():
            ThreePointArc((12.7, -150.9), (3.719743879, -154.619743879), (0, -163.6))
            Line((0, -163.6), (0, -461.245130056))
            ThreePointArc((0, -461.245130056), (1.56229243, -465.016837626), (5.334, -466.579130056))
            Line((5.334, -466.579130056), (309.66453199, -466.579130056))
            Line((309.66453199, -466.579130056), (316.3, -241.3))
            ThreePointArc((316.3, -241.3), (75, 0), (316.3, 241.3))
            Line((316.3, 241.3), (276.032946761, 283.456663644))
            ThreePointArc((276.032946761, 283.456663644), (270.588863094, 286.821521817), (264.195081913, 287.104151799))
            Line((264.195081913, 287.104151799), (245.952992349, 283.205693921))
            ThreePointArc((245.952992349, 283.205693921), (239.977011634, 283.367384751), (234.737080357, 286.245163347))
            Line((234.737080357, 286.245163347), (60.617668132, 445.174294781))
            ThreePointArc((60.617668132, 445.174294781), (56.482733464, 454.264990592), (60.199179654, 463.534643376))
            Line((60.199179654, 463.534643376), (73.838585609, 477.174049331))
            ThreePointArc((73.838585609, 477.174049331), (77.557495428, 486.008756787), (74.042049988, 494.926379196))
            Line((74.042049988, 494.926379196), (62.220398575, 507.302784775))
            ThreePointArc((62.220398575, 507.302784775), (53.18222674, 511.229876971), (44.056421954, 507.510967151))
            Line((44.056421954, 507.510967151), (1.562292429, 465.016837626))
            ThreePointArc((1.562292429, 465.016837626), (0.406026574, 463.286363484), (0, 461.245130056))
            Line((0, 461.245130056), (0, 163.6))
            ThreePointArc((0, 163.6), (3.719743879, 154.619743879), (12.7, 150.9))
            Line((12.7, 150.9), (50.8, 150.9))
            Line((50.8, 150.9), (50.8, 100.1))
            Line((50.8, 100.1), (12.7, 100.1))
            ThreePointArc((12.7, 100.1), (3.719743879, 96.380256121), (0, 87.4))
            Line((0, 87.4), (0, -87.4))
            ThreePointArc((0, -87.4), (3.719743879, -96.380256121), (12.7, -100.1))
            Line((12.7, -100.1), (50.8, -100.1))
            Line((50.8, -100.1), (50.8, -150.9))
            Line((50.8, -150.9), (12.7, -150.9))
        make_face()
        with BuildLine():
            Line((131.394052066, -199.403618246), (194.156373438, -259.846997017))
            ThreePointArc((194.156373438, -259.846997017), (198.032828609, -269.588102319), (193.263931773, -278.924785894))
            Line((193.263931773, -278.924785894), (71.417230327, -376.07240504))
            ThreePointArc((71.417230327, -376.07240504), (57.98904841, -377.584278062), (50.8, -366.142275939))
            Line((50.8, -366.142275939), (50.8, -176.3))
            Line((50.8, -176.3), (76.2, -176.3))
            ThreePointArc((76.2, -176.3), (105.959731151, -182.685152645), (131.394052066, -199.403618246))
        make_face(mode=Mode.SUBTRACT)
        with BuildLine():
            Line((248.00734903, -415.779130056), (139.404356101, -415.779130056))
            ThreePointArc((139.404356101, -415.779130056), (127.41680757, -407.273016107), (131.487125774, -393.149000955))
            Line((131.487125774, -393.149000955), (242.701867121, -304.478177637))
            ThreePointArc((242.701867121, -304.478177637), (256.297905781, -303.048679283), (263.313592002, -314.782215819))
            Line((263.313592002, -314.782215819), (260.701843584, -403.453039137))
            ThreePointArc((260.701843584, -403.453039137), (256.854420711, -412.190624042), (248.00734903, -415.779130056))
        make_face(mode=Mode.SUBTRACT)
        with BuildLine():
            Line((177.260013842, 252.215196046), (127.653495748, 201.052217116))
            ThreePointArc((127.653495748, 201.052217116), (104.130662555, 184.094736548), (76.2, 176.3))
            Line((76.2, 176.3), (50.8, 176.3))
            Line((50.8, 176.3), (50.8, 356.568787103))
            ThreePointArc((50.8, 356.568787103), (58.373814726, 368.18826319), (72.061767643, 365.948879577))
            Line((72.061767643, 365.948879577), (176.703906107, 270.435783335))
            ThreePointArc((176.703906107, 270.435783335), (180.836227428, 261.443125193), (177.260013842, 252.215196046))
        make_face(mode=Mode.SUBTRACT)
    extrude(amount=CONVERT_WEBBING_TO_SHEET_DEPTH)

    # Fillet2
    fillet2_edges = [body_5.edges().sort_by_distance(p)[0] for p in [
        (0, 50.8, 176.3),
        (0, 50.8, -176.3),
    ]]
    fillet(fillet2_edges, radius=FILLET2_R)


solid = Compound([body_2.part, body_4.part, body_5.part])
